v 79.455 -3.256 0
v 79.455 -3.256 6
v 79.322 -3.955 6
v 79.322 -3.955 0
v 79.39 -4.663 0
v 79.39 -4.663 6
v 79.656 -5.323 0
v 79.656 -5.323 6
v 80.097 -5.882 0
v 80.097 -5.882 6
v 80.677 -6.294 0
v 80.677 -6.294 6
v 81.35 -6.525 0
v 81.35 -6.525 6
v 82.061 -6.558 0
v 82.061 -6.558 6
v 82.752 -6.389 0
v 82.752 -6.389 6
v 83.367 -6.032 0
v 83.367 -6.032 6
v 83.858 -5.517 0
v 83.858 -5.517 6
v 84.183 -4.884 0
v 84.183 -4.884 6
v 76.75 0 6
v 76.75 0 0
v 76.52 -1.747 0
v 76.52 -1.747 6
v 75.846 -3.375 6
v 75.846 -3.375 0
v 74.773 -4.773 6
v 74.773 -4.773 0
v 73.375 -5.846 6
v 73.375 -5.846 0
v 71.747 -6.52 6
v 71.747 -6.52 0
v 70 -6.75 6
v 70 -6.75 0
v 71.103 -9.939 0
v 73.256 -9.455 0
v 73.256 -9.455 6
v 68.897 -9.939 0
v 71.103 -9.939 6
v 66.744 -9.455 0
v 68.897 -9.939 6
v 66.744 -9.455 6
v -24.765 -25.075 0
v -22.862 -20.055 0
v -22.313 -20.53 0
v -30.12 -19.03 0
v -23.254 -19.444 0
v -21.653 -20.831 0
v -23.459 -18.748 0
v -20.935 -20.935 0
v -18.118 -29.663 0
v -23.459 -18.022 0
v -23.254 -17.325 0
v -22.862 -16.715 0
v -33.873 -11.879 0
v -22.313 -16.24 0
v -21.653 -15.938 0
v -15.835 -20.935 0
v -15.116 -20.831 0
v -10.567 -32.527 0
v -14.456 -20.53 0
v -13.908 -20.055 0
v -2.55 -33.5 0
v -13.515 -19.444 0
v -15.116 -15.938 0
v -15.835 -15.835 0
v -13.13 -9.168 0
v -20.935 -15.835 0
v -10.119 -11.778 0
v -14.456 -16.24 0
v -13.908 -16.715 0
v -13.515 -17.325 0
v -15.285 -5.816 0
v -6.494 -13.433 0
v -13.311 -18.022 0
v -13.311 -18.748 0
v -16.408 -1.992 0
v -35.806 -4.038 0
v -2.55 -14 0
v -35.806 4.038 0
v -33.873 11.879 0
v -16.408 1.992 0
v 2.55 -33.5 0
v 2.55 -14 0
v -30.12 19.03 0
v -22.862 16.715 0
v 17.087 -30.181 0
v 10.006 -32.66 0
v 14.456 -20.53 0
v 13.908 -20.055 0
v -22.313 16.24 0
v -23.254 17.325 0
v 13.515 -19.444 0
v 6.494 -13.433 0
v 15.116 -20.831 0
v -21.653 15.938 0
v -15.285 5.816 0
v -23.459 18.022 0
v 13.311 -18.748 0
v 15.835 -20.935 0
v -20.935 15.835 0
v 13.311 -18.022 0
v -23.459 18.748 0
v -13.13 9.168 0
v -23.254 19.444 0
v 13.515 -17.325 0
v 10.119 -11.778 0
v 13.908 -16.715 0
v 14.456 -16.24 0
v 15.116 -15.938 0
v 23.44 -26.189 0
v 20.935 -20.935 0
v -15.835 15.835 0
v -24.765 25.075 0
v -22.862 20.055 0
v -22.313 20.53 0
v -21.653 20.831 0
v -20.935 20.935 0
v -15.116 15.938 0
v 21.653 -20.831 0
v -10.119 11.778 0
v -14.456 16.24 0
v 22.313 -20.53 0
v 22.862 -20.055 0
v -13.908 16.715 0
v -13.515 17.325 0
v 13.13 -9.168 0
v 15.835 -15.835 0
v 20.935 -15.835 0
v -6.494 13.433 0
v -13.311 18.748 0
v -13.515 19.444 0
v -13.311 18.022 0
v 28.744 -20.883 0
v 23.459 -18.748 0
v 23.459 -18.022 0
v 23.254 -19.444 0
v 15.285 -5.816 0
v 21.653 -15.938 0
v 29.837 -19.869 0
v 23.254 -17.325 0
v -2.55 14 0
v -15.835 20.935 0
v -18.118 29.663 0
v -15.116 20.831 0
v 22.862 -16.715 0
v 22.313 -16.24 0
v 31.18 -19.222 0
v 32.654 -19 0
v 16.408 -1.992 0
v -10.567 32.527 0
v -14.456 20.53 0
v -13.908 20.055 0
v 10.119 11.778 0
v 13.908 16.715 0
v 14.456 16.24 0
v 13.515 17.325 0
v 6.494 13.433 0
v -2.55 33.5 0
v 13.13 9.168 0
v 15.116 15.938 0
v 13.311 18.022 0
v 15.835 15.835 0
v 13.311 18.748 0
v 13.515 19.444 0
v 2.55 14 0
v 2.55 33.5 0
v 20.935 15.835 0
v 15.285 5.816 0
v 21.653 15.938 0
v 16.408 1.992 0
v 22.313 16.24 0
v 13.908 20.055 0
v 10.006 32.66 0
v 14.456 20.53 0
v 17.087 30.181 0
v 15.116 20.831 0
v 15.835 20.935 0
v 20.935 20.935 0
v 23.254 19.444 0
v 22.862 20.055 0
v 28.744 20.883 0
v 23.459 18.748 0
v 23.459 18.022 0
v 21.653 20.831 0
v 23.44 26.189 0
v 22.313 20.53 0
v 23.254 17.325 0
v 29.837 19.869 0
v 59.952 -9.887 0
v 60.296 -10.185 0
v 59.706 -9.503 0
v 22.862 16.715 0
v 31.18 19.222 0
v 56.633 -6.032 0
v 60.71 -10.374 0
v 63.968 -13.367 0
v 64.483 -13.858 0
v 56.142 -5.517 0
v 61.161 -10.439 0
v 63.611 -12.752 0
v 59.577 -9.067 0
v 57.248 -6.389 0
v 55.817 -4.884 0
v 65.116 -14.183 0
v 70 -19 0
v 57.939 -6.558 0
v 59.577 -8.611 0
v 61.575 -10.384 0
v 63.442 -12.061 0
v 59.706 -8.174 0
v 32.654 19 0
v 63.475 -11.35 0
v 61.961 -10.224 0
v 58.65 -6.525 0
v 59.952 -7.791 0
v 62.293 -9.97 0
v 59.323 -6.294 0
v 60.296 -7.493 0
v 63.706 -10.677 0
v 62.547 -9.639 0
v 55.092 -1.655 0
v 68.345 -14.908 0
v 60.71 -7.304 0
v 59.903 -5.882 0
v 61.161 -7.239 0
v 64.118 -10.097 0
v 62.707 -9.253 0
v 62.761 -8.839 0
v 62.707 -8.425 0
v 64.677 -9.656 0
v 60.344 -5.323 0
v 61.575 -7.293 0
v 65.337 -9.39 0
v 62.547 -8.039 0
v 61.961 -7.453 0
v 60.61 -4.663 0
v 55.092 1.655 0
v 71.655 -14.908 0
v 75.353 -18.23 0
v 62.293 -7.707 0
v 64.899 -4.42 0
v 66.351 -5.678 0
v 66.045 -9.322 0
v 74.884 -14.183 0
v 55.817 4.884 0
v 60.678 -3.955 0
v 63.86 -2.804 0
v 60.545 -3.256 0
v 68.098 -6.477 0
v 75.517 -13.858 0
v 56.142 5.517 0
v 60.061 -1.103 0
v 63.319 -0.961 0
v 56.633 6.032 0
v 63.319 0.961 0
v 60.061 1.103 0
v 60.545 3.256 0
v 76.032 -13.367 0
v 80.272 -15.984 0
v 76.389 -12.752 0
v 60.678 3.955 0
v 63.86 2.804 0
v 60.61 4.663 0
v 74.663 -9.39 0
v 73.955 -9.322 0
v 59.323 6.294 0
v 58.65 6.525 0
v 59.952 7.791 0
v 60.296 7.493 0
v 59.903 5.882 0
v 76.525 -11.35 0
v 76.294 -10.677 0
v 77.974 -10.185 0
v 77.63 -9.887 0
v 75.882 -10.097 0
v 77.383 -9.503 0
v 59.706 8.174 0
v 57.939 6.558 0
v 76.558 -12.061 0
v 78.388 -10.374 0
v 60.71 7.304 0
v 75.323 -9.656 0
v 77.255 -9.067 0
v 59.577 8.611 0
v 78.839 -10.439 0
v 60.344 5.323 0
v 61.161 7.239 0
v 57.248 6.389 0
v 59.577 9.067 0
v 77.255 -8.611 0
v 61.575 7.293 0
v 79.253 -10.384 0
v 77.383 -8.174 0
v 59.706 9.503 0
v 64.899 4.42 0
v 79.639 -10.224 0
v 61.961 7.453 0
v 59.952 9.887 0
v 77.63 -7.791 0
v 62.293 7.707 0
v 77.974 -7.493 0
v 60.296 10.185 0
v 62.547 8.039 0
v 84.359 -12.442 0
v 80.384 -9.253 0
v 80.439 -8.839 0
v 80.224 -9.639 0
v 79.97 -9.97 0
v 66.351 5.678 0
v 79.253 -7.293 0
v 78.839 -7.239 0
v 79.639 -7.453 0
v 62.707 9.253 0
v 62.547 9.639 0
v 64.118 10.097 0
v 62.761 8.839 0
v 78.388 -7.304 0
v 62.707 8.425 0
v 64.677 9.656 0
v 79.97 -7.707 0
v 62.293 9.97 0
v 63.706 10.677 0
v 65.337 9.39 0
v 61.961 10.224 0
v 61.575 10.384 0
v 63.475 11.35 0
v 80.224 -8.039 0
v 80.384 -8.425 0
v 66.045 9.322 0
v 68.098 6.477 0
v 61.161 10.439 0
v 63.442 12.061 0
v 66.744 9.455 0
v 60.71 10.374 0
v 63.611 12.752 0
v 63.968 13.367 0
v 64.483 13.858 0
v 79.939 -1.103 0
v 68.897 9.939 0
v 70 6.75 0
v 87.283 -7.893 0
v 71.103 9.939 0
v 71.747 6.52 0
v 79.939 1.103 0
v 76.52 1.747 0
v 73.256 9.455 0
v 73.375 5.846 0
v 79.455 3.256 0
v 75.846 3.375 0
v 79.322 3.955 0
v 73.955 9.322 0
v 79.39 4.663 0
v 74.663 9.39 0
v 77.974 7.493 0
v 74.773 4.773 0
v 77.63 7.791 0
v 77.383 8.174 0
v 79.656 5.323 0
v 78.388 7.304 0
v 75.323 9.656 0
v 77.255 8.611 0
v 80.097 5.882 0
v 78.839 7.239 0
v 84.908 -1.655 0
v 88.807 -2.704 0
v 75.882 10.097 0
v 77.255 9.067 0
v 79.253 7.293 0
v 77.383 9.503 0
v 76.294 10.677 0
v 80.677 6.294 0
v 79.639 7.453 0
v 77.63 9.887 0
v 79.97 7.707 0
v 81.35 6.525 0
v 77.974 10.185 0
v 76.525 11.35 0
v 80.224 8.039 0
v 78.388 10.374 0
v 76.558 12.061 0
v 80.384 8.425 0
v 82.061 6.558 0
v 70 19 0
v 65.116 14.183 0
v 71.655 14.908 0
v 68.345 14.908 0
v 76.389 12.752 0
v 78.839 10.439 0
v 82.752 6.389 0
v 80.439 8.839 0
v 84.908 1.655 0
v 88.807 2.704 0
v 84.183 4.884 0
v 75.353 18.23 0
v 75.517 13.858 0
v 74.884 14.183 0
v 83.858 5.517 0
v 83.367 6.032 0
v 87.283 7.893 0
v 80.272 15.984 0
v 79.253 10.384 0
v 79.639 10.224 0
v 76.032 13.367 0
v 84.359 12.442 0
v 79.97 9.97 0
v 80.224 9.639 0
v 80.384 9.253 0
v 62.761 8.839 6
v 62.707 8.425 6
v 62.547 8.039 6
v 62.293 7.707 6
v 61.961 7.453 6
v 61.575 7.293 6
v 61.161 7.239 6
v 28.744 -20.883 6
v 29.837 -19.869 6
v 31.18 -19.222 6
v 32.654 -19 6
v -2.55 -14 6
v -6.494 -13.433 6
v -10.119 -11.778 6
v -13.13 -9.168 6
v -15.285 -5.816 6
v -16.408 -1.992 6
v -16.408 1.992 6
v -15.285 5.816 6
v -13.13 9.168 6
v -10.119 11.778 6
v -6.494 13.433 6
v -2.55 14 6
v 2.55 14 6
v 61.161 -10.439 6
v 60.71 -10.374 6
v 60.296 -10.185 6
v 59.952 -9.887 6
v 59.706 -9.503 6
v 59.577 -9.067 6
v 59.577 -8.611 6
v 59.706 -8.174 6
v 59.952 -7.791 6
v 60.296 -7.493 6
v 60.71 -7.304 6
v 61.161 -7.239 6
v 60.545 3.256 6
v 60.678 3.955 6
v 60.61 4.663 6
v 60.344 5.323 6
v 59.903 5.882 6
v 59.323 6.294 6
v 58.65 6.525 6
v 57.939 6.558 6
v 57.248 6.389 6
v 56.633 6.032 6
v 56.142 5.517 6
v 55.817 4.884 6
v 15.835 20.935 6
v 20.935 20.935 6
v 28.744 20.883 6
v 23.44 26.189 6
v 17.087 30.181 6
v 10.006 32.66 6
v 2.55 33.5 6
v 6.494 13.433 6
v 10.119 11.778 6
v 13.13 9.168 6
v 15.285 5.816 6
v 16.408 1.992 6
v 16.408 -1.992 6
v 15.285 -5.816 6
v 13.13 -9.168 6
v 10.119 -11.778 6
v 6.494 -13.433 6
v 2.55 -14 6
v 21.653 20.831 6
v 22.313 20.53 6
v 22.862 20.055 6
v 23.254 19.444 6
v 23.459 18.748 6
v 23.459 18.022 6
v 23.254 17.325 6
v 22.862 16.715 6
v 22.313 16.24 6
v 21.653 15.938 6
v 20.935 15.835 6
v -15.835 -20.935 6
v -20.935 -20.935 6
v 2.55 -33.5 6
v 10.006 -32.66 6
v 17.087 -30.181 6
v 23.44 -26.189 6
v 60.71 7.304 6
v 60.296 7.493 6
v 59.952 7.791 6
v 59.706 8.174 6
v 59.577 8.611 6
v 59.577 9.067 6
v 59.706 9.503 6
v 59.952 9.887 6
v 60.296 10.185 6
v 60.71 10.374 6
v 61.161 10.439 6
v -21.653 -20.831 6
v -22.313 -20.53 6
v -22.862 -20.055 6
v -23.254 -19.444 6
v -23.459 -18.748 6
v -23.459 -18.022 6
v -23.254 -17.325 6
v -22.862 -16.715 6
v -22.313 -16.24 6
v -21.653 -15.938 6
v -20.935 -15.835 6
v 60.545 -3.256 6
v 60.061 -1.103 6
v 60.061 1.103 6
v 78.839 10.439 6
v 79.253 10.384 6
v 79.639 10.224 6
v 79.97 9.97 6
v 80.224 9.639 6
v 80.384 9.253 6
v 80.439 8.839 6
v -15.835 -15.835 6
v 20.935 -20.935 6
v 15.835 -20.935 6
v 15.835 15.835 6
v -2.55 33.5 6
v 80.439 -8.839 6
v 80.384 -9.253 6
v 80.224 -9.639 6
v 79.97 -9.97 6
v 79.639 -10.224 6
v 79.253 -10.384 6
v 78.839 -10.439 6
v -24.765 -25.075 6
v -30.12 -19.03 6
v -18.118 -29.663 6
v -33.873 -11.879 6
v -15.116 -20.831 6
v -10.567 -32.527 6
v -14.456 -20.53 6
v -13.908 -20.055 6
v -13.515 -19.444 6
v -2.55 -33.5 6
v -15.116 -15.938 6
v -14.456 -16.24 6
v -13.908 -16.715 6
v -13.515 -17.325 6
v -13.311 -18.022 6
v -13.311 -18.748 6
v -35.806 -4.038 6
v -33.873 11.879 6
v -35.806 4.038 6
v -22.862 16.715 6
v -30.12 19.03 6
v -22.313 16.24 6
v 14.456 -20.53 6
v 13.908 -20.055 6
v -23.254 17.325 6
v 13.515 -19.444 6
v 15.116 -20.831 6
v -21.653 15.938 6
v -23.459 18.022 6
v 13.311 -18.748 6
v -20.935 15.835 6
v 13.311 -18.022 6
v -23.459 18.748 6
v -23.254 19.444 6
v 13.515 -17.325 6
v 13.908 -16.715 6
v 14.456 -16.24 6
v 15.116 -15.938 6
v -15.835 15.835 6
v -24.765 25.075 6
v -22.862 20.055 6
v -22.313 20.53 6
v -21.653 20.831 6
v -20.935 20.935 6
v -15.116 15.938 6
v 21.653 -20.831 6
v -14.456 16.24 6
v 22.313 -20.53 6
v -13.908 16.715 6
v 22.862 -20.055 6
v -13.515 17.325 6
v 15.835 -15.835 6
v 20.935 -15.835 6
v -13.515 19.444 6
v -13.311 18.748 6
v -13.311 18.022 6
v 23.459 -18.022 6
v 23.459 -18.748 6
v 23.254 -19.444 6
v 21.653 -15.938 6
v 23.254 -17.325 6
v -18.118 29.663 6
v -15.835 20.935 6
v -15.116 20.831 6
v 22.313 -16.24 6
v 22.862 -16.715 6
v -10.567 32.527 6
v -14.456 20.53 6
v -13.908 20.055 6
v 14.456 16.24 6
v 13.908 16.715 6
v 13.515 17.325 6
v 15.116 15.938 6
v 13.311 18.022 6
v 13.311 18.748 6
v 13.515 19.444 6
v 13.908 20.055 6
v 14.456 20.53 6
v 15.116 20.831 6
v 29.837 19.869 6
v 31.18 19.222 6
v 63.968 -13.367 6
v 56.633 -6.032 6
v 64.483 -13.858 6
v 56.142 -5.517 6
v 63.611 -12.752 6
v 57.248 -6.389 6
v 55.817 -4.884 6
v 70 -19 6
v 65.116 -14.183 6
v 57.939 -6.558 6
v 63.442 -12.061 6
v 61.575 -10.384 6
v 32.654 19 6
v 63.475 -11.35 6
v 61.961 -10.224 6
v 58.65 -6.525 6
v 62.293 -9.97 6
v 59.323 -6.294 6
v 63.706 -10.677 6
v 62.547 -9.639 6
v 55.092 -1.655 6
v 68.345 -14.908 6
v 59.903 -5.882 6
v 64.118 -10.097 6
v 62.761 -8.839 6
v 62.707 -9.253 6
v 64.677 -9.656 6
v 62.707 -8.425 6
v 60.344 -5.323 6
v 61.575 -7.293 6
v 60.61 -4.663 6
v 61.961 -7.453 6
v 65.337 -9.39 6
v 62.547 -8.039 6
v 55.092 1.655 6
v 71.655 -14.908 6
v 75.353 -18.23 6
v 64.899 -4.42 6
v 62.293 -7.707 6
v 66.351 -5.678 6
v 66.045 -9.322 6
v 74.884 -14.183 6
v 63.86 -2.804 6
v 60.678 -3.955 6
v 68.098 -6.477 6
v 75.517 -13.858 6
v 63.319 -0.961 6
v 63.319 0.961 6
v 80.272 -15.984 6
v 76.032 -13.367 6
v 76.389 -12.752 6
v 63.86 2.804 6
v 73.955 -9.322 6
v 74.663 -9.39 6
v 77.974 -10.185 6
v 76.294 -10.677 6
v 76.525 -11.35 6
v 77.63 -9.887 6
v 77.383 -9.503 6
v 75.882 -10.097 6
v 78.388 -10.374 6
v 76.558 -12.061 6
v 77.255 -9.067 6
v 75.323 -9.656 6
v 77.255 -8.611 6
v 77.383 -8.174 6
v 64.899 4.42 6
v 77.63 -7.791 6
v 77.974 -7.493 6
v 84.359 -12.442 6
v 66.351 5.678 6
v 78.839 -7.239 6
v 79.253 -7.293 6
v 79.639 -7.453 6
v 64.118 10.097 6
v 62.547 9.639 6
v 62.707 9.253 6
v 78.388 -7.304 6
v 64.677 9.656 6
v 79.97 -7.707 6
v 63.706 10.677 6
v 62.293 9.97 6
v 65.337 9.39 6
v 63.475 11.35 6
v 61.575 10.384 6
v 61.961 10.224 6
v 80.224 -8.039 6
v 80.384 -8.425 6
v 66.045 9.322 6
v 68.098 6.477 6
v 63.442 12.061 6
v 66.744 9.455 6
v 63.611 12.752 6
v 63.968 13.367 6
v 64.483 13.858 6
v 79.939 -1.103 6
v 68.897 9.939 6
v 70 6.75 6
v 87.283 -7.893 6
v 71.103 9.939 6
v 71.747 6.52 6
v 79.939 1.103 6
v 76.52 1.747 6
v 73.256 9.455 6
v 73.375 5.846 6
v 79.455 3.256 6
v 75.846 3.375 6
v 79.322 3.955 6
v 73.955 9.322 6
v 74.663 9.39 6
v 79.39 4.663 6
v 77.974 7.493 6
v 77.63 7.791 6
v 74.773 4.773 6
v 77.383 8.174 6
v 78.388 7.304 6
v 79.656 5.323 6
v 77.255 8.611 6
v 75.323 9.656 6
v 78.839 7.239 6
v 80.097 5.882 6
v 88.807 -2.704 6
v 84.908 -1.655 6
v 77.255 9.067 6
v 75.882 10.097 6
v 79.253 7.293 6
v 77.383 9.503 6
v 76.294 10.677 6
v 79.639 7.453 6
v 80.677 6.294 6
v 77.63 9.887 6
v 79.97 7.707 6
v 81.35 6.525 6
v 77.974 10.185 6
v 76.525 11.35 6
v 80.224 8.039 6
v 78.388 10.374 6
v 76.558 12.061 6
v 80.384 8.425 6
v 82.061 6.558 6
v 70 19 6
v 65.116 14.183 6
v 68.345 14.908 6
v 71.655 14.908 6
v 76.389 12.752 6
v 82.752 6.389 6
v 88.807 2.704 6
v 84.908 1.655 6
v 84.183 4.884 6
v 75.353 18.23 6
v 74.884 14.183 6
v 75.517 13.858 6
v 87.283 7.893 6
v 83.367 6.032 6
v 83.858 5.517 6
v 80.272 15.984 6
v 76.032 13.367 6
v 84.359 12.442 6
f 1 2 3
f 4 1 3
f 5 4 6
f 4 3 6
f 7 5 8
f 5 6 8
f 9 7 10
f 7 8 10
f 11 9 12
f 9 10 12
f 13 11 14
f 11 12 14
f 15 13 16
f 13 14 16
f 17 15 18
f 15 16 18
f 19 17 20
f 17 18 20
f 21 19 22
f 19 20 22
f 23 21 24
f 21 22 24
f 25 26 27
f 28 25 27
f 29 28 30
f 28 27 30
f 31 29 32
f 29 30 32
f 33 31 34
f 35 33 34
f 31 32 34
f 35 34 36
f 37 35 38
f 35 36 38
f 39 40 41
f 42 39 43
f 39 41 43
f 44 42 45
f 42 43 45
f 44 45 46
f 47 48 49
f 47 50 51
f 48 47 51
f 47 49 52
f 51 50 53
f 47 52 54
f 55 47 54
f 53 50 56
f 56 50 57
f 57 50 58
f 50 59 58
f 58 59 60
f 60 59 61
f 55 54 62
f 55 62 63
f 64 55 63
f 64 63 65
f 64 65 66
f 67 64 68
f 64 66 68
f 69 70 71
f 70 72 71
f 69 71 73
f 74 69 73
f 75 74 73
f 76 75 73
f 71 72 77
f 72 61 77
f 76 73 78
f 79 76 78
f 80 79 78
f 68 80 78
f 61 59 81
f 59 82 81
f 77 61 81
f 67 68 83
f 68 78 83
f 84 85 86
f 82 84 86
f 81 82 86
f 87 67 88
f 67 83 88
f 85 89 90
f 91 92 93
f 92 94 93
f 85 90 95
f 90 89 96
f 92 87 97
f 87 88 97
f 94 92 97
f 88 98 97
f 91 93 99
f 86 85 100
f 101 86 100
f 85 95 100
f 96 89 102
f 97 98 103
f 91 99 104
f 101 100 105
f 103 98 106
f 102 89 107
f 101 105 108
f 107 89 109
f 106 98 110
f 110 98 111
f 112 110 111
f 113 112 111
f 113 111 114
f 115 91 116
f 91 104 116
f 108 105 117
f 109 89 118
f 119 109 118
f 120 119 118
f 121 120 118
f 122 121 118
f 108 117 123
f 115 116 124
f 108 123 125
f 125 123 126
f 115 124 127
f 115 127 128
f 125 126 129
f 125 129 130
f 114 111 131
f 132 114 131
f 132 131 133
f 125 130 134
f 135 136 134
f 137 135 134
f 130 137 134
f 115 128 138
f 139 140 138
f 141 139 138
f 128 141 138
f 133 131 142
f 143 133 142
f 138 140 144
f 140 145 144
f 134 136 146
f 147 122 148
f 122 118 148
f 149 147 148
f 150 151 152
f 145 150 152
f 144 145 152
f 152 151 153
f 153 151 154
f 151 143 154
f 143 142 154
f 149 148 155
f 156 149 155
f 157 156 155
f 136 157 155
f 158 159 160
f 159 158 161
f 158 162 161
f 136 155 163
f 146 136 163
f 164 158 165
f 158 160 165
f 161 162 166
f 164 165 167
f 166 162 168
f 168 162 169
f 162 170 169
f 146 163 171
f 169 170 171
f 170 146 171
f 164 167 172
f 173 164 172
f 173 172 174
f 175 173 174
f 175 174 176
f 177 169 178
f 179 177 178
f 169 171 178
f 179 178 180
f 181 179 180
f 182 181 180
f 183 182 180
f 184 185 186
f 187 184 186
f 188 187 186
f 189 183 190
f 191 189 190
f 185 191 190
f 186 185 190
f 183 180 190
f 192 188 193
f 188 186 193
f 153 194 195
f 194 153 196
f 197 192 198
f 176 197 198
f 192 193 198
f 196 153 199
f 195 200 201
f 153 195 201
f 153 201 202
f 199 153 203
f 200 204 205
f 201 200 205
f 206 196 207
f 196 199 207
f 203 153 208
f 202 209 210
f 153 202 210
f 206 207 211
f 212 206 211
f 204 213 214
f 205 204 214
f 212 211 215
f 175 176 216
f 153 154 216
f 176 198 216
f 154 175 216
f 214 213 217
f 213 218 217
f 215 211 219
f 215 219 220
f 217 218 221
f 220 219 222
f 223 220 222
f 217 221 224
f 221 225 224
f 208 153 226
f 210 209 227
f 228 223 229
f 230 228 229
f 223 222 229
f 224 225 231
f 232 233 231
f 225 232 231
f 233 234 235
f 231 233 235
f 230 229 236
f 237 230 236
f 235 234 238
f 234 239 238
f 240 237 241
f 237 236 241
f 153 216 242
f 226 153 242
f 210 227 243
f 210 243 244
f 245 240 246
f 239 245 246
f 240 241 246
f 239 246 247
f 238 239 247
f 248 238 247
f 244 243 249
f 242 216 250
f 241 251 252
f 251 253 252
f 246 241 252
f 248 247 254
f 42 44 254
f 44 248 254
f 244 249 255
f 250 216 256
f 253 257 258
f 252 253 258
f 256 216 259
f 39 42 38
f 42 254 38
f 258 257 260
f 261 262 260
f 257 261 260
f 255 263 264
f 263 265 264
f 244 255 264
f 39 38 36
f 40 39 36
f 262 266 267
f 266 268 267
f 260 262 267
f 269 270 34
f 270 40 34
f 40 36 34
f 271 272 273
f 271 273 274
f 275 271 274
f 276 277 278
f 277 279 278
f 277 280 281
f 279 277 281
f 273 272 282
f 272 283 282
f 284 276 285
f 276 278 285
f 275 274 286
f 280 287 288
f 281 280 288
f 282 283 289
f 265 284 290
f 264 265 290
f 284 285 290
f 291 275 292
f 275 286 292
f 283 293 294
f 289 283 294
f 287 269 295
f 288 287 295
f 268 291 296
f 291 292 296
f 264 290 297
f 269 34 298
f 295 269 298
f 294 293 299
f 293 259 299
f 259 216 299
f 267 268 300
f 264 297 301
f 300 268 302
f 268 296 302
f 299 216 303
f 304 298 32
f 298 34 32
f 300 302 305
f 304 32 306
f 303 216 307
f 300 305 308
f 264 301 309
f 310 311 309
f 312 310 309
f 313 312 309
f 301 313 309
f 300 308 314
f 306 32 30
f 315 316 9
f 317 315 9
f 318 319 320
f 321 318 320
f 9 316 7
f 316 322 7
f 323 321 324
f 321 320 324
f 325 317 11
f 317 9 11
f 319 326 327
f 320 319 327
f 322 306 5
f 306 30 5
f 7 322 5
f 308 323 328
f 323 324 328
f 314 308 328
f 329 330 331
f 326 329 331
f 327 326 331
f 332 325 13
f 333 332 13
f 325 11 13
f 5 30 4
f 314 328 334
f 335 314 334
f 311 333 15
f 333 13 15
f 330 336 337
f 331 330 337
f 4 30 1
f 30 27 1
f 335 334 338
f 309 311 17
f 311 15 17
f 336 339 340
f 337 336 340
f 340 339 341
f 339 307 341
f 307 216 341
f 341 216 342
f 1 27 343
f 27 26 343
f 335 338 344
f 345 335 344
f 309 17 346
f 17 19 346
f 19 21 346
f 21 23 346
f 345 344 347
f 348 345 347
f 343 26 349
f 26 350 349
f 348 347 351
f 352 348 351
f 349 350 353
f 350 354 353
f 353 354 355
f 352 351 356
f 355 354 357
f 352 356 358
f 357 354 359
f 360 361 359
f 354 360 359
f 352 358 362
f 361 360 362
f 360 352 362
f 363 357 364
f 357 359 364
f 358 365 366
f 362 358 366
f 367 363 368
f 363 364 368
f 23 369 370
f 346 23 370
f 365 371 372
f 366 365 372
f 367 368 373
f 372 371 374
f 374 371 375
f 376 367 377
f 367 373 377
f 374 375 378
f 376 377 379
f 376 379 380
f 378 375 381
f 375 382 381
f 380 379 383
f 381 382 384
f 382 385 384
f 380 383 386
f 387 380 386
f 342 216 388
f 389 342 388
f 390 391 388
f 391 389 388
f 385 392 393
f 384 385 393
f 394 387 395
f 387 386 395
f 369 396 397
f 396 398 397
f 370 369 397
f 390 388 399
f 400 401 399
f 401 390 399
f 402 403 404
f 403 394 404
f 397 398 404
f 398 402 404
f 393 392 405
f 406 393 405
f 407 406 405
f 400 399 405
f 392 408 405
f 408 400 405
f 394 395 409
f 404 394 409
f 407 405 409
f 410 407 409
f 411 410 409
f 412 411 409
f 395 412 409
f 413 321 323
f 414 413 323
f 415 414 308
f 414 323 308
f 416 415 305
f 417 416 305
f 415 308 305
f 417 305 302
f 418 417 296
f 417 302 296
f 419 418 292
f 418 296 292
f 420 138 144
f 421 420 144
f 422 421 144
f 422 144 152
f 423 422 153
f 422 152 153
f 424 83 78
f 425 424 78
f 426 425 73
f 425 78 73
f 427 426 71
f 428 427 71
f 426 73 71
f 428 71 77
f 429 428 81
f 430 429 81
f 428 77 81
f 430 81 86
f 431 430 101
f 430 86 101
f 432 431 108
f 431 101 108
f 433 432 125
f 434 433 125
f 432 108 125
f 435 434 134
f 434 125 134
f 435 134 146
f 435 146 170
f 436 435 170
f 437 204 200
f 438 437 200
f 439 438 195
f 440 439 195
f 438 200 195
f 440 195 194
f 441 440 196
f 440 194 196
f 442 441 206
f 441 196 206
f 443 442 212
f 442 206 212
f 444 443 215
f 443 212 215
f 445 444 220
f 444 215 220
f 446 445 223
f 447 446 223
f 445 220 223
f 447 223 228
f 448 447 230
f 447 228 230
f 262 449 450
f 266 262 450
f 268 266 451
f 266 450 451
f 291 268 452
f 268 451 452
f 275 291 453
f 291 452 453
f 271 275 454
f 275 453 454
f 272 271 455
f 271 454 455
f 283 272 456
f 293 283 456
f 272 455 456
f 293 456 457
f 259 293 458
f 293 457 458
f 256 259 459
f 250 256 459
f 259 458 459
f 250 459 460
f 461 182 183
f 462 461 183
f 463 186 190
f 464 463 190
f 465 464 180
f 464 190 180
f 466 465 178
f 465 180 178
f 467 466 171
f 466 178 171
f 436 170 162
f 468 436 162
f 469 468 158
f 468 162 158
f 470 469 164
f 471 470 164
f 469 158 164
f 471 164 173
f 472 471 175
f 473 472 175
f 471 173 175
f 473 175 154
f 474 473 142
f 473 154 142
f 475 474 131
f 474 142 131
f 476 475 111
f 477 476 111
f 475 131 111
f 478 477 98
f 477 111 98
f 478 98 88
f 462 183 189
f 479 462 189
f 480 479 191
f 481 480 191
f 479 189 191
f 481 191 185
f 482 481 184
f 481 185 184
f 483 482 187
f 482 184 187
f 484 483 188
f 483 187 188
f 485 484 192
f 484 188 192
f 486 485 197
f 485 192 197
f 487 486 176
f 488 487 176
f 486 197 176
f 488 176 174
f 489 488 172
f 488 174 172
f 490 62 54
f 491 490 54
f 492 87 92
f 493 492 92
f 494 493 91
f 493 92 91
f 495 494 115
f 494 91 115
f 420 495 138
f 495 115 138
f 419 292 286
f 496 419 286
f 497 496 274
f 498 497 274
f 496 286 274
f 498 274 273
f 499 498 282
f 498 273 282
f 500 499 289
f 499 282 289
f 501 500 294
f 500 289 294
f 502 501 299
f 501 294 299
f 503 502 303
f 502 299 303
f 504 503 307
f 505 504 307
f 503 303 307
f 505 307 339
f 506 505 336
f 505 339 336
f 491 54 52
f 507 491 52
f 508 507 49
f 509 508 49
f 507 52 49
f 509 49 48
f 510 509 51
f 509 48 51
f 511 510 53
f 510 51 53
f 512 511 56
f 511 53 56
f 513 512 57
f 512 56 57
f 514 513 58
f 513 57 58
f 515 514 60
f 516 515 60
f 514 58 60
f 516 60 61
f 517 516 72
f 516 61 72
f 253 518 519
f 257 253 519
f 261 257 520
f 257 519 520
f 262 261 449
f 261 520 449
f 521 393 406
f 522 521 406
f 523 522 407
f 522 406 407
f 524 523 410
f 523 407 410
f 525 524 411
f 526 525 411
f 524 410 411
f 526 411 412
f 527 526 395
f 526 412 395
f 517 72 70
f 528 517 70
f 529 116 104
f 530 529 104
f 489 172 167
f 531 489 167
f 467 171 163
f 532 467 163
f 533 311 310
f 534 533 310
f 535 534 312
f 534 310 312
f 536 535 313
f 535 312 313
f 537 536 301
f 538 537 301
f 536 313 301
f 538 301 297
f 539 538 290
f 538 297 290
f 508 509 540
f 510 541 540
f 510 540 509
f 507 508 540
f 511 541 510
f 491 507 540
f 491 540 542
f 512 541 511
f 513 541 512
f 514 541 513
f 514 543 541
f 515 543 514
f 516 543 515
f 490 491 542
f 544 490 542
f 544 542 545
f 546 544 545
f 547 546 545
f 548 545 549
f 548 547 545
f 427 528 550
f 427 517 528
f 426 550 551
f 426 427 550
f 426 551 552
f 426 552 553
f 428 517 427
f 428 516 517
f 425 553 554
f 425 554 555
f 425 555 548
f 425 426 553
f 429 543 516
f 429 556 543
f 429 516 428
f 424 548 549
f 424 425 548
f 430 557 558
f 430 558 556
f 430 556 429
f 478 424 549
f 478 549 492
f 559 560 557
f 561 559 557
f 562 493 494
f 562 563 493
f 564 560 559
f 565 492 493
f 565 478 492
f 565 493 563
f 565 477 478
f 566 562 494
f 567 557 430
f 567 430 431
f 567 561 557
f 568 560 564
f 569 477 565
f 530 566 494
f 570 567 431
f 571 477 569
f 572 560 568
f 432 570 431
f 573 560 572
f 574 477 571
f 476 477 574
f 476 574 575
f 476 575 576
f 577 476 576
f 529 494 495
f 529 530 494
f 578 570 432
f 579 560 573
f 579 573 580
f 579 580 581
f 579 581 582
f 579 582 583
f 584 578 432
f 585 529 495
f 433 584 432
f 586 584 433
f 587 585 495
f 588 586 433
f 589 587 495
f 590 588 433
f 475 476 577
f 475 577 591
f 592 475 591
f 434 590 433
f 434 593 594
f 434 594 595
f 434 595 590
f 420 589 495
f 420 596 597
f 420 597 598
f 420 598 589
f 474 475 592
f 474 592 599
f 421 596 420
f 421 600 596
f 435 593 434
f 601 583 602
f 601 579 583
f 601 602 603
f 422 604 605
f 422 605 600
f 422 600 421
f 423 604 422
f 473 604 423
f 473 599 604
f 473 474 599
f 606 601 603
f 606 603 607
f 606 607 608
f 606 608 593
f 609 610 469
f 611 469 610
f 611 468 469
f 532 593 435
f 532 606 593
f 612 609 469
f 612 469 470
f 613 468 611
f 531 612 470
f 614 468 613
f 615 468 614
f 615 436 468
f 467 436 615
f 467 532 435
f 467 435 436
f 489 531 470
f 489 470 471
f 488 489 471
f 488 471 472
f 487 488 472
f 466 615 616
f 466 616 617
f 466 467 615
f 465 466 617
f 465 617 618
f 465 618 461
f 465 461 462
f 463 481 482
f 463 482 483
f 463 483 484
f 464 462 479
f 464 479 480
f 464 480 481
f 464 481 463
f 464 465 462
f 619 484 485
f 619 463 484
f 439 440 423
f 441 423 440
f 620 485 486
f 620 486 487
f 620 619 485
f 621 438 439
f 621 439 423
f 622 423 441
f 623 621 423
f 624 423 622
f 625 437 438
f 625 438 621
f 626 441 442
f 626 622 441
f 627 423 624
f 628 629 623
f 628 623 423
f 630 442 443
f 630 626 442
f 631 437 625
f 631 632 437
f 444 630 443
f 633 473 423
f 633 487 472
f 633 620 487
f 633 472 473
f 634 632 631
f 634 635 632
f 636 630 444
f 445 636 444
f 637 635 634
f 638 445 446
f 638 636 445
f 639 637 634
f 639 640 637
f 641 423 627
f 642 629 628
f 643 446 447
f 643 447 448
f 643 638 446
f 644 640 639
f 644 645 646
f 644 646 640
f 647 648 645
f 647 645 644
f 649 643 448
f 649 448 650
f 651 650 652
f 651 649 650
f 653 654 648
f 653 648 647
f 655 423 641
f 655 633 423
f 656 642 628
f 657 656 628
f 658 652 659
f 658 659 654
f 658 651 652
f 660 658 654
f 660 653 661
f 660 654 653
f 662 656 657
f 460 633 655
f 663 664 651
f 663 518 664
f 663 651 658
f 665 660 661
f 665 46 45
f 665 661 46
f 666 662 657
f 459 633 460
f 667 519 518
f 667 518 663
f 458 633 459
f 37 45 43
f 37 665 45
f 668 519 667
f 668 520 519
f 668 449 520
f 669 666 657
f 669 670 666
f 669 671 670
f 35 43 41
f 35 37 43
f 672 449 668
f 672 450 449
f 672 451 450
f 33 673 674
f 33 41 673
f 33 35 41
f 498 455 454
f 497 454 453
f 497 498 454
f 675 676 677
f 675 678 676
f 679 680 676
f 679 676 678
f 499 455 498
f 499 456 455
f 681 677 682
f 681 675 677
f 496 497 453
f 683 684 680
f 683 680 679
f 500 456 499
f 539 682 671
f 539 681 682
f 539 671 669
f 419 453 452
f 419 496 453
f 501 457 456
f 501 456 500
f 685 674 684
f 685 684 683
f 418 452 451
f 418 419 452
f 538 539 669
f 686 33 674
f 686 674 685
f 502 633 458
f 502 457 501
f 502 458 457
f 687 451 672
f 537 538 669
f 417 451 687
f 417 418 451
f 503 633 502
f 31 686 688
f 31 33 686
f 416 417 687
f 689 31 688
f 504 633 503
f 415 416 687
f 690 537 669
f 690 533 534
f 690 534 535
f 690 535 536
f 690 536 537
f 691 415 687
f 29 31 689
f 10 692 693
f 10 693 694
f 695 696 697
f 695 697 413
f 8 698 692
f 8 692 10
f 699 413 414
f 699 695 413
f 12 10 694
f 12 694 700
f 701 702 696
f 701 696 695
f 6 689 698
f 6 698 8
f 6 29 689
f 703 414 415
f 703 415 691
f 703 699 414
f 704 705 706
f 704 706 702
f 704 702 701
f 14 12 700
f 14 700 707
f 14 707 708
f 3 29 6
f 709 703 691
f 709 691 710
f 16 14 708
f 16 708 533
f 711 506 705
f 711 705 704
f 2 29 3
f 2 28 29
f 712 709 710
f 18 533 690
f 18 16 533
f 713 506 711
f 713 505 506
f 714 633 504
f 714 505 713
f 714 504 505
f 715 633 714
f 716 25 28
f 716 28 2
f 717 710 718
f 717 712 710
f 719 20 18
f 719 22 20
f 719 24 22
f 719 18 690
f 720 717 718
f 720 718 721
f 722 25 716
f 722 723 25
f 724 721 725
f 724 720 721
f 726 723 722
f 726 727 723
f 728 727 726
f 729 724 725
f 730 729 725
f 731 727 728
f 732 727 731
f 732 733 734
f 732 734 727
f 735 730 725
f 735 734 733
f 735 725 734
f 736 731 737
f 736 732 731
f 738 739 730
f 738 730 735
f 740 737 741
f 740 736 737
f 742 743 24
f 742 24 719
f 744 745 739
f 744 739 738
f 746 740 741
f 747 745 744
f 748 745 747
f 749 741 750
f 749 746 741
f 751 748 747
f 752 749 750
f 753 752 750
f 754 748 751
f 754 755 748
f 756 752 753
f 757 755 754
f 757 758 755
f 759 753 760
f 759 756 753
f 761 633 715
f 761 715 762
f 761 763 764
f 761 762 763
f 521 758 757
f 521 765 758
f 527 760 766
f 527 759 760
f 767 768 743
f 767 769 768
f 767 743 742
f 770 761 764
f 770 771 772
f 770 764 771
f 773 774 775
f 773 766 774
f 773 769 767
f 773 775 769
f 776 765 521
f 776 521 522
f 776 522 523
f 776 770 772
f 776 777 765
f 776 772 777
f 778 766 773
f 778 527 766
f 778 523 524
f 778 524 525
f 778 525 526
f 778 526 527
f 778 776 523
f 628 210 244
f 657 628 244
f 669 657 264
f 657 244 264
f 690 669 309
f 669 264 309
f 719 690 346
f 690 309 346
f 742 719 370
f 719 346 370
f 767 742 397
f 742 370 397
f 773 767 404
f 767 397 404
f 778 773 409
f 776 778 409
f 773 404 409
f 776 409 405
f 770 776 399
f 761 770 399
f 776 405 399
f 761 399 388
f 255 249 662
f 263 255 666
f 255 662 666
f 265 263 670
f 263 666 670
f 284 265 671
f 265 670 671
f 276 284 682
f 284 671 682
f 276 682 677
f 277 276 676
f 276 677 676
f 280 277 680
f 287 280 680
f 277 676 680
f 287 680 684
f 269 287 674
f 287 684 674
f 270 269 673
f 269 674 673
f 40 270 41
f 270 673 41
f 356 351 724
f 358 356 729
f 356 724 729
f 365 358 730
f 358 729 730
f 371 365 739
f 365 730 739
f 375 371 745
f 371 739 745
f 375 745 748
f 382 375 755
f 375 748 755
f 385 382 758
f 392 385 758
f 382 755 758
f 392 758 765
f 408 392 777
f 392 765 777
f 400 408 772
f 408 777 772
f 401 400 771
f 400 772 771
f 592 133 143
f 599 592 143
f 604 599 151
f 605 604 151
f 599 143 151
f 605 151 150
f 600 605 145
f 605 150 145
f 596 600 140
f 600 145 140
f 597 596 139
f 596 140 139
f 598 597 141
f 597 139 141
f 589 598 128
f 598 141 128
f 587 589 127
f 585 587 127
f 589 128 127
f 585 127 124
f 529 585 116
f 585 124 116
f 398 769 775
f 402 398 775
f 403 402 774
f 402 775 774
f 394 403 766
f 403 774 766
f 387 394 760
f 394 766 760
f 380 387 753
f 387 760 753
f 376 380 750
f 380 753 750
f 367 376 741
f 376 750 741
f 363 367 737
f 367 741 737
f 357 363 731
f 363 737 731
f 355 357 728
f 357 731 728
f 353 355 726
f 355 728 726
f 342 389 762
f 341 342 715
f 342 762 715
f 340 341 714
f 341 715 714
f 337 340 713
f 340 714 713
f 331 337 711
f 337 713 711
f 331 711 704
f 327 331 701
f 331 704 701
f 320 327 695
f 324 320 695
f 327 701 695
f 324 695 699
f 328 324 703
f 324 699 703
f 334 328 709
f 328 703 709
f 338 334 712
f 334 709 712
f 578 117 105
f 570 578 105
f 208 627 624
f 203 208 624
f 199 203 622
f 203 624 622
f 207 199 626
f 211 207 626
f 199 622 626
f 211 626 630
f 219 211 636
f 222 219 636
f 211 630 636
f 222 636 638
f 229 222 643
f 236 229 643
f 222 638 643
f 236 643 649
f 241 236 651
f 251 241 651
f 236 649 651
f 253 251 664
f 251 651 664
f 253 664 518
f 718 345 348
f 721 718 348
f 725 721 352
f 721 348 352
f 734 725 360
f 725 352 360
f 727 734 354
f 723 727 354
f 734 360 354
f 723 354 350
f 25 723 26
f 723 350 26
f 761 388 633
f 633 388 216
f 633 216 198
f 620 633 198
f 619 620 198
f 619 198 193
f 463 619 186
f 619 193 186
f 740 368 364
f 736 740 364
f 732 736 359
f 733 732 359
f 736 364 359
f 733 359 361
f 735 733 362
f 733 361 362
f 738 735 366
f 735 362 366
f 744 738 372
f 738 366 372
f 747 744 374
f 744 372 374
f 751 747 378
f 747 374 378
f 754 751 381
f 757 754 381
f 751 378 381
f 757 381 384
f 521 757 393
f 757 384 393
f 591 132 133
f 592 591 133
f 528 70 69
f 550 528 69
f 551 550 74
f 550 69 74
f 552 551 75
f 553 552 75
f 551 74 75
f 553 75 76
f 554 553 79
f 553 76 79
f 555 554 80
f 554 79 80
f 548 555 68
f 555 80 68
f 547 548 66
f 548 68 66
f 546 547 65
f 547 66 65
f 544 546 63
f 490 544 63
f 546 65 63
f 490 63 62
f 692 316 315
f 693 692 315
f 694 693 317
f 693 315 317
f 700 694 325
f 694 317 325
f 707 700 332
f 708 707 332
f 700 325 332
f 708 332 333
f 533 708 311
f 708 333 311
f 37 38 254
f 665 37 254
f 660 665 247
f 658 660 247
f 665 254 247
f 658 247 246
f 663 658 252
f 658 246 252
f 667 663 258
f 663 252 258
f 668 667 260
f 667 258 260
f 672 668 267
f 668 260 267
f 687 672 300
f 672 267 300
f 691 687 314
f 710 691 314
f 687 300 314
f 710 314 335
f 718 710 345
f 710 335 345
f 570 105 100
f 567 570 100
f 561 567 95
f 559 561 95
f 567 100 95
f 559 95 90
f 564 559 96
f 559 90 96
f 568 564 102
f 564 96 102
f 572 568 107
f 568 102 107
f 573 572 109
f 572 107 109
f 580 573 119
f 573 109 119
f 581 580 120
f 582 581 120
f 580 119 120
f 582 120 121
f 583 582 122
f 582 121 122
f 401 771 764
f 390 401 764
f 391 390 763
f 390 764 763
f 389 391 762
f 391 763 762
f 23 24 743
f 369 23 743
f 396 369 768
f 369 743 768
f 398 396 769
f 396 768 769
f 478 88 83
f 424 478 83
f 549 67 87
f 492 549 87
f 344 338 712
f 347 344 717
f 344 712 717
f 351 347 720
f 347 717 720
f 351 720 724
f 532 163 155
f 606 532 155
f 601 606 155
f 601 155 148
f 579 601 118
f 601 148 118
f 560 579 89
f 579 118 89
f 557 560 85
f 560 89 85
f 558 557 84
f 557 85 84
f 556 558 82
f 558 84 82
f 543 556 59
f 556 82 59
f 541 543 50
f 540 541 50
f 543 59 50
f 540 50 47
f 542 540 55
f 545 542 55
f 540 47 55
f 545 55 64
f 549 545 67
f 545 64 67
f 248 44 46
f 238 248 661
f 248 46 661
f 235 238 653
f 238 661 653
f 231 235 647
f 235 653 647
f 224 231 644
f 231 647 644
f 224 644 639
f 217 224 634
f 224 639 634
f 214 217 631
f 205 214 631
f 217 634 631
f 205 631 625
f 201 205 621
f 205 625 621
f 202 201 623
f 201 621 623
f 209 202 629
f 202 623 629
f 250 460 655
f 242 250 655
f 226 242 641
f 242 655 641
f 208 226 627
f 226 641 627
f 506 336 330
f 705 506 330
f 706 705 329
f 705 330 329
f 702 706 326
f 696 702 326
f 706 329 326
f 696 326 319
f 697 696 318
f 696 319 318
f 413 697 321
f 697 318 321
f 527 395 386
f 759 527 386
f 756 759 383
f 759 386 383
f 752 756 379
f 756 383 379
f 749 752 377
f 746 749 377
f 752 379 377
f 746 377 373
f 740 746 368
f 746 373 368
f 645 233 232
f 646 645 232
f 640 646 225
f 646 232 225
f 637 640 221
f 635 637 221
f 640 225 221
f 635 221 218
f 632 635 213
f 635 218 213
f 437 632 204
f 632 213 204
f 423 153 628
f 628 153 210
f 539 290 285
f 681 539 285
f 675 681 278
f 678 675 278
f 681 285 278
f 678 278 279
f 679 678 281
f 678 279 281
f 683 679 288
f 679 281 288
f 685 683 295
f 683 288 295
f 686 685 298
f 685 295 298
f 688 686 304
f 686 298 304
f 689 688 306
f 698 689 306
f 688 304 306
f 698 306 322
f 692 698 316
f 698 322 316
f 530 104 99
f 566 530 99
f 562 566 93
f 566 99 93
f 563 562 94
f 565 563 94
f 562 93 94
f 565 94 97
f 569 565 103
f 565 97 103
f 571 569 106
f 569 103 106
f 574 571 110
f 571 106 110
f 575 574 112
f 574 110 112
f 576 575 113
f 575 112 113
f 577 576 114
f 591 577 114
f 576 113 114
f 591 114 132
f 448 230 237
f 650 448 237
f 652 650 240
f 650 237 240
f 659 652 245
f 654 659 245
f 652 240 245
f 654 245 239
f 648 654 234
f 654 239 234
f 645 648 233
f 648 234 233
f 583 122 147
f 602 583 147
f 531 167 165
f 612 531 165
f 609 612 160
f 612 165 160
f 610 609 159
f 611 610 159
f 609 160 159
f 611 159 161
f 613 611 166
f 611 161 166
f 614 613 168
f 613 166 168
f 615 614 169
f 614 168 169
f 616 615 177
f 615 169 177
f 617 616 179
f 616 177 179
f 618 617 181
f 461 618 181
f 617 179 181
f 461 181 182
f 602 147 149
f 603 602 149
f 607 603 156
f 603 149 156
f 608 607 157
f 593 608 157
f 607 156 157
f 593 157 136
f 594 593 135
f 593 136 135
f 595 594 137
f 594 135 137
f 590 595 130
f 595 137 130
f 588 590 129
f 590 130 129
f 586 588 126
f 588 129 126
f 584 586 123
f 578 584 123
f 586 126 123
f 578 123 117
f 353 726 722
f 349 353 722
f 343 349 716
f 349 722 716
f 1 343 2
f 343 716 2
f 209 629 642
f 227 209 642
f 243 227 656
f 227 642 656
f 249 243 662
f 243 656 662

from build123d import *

# Parameters (mm, degrees)
F1_DEPTH = 6
F3_DEPTH = 25


with BuildPart() as f1:
    # F0 (on Top) → F1 (new body)
    with BuildSketch(Plane.XY):
        with BuildLine():
            Line((32.653986447, -19), (70, -19))
            ThreePointArc((70, -19), (89, 0), (70, 19))
            Line((70, 19), (32.653986447, 19))
            ThreePointArc((32.653986447, 19), (30.4842417137, 19.4953126865), (28.7443778175, 20.8831168831))
            ThreePointArc((28.7443778175, 20.8831168831), (17.0872897133, 30.1814050003), (2.55, 33.5))
            Line((2.55, 33.5), (-2.55, 33.5))
            ThreePointArc((-2.55, 33.5), (-36.05, 0), (-2.55, -33.5))
            Line((-2.55, -33.5), (2.55, -33.5))
            ThreePointArc((2.55, -33.5), (17.0872897133, -30.1814050003), (28.7443778175, -20.8831168831))
            ThreePointArc((28.7443778175, -20.8831168831), (30.4842417137, -19.4953126865), (32.653986447, -19))
        make_face()
        with BuildLine():
            Line((-15.8347763109, -20.9347763109), (-20.9347763109, -20.9347763109))
            ThreePointArc((-20.9347763109, -20.9347763109), (-23.4847763109, -18.3847763109), (-20.9347763109, -15.8347763109))
            Line((-20.9347763109, -15.8347763109), (-15.8347763109, -15.8347763109))
            ThreePointArc((-15.8347763109, -15.8347763109), (-13.2847763109, -18.3847763109), (-15.8347763109, -20.9347763109))
        make_face(mode=Mode.SUBTRACT)
        with BuildLine():
            Line((20.9347763109, -20.9347763109), (15.8347763109, -20.9347763109))
            ThreePointArc((15.8347763109, -20.9347763109), (13.2847763109, -18.3847763109), (15.8347763109, -15.8347763109))
            Line((15.8347763109, -15.8347763109), (20.9347763109, -15.8347763109))
            ThreePointArc((20.9347763109, -15.8347763109), (23.4847763109, -18.3847763109), (20.9347763109, -20.9347763109))
        make_face(mode=Mode.SUBTRACT)
        with BuildLine():
            ThreePointArc((61.1611652352, -7.2388347648), (62.2925360851, -7.7074639149), (62.7611652352, -8.8388347648))
            ThreePointArc((62.7611652352, -8.8388347648), (62.2925360851, -9.9702056147), (61.1611652352, -10.4388347648))
            ThreePointArc((61.1611652352, -10.4388347648), (59.5611652352, -8.8388347648), (61.1611652352, -7.2388347648))
        make_face(mode=Mode.SUBTRACT)
        with BuildLine():
            ThreePointArc((78.8388347648, -7.2388347648), (79.9702056147, -7.7074639149), (80.4388347648, -8.8388347648))
            ThreePointArc((80.4388347648, -8.8388347648), (79.9702056147, -9.9702056147), (78.8388347648, -10.4388347648))
            ThreePointArc((78.8388347648, -10.4388347648), (77.2388347648, -8.8388347648), (78.8388347648, -7.2388347648))
        make_face(mode=Mode.SUBTRACT)
        with BuildLine():
            Line((-2.55, 14), (2.55, 14))
            ThreePointArc((2.55, 14), (16.55, 0), (2.55, -14))
            Line((2.55, -14), (-2.55, -14))
            ThreePointArc((-2.55, -14), (-16.55, 0), (-2.55, 14))
        make_face(mode=Mode.SUBTRACT)
        with BuildLine():
            Line((-15.8347763109, 15.8347763109), (-20.9347763109, 15.8347763109))
            ThreePointArc((-20.9347763109, 15.8347763109), (-23.4847763109, 18.3847763109), (-20.9347763109, 20.9347763109))
            Line((-20.9347763109, 20.9347763109), (-15.8347763109, 20.9347763109))
            ThreePointArc((-15.8347763109, 20.9347763109), (-13.2847763109, 18.3847763109), (-15.8347763109, 15.8347763109))
        make_face(mode=Mode.SUBTRACT)
        with BuildLine():
            Line((20.9347763109, 15.8347763109), (15.8347763109, 15.8347763109))
            ThreePointArc((15.8347763109, 15.8347763109), (13.2847763109, 18.3847763109), (15.8347763109, 20.9347763109))
            Line((15.8347763109, 20.9347763109), (20.9347763109, 20.9347763109))
            ThreePointArc((20.9347763109, 20.9347763109), (23.4847763109, 18.3847763109), (20.9347763109, 15.8347763109))
        make_face(mode=Mode.SUBTRACT)
        with BuildLine():
            ThreePointArc((70, 6.75), (74.772970773, 4.772970773), (76.75, 0))
            ThreePointArc((76.75, 0), (74.772970773, -4.772970773), (70, -6.75))
            ThreePointArc((70, -6.75), (63.25, 0), (70, 6.75))
        make_face(mode=Mode.SUBTRACT)
        with BuildLine():
            ThreePointArc((61.1611652352, 10.4388347648), (62.2925360851, 9.9702056147), (62.7611652352, 8.8388347648))
            ThreePointArc((62.7611652352, 8.8388347648), (62.2925360851, 7.7074639149), (61.1611652352, 7.2388347648))
            ThreePointArc((61.1611652352, 7.2388347648), (59.5611652352, 8.8388347648), (61.1611652352, 10.4388347648))
        make_face(mode=Mode.SUBTRACT)
        with BuildLine():
            ThreePointArc((78.8388347648, 10.4388347648), (79.9702056147, 9.9702056147), (80.4388347648, 8.8388347648))
            ThreePointArc((80.4388347648, 8.8388347648), (79.9702056147, 7.7074639149), (78.8388347648, 7.2388347648))
            ThreePointArc((78.8388347648, 7.2388347648), (77.2388347648, 8.8388347648), (78.8388347648, 10.4388347648))
        make_face(mode=Mode.SUBTRACT)
    extrude(amount=F1_DEPTH)

    # F2 (on face) → F3 (cut)
    with BuildSketch(Plane.XY.offset(6)):
        with BuildLine():
            ThreePointArc((60.544814244, 3.2556815446), (58.9949381912, 6.4333983697), (55.817221366, 4.8835223169))
            ThreePointArc((55.817221366, 4.8835223169), (55, 0), (55.817221366, -4.8835223169))
            ThreePointArc((55.817221366, -4.8835223169), (58.9949381912, -6.4333983697), (60.544814244, -3.2556815446))
            ThreePointArc((60.544814244, -3.2556815446), (60, 0), (60.544814244, 3.2556815446))
        make_face()
        with BuildLine():
            ThreePointArc((66.7443184554, -9.455185756), (63.5666016303, -11.0050618088), (65.1164776831, -14.182778634))
            ThreePointArc((65.1164776831, -14.182778634), (70, -15), (74.8835223169, -14.182778634))
            ThreePointArc((74.8835223169, -14.182778634), (76.4333983697, -11.0050618088), (73.2556815446, -9.455185756))
            ThreePointArc((73.2556815446, -9.455185756), (70, -10), (66.7443184554, -9.455185756))
        make_face()
        with BuildLine():
            ThreePointArc((79.455185756, -3.2556815446), (81.0050618088, -6.4333983697), (84.182778634, -4.8835223169))
            ThreePointArc((84.182778634, -4.8835223169), (85, 0), (84.182778634, 4.8835223169))
            ThreePointArc((84.182778634, 4.8835223169), (81.0050618088, 6.4333983697), (79.455185756, 3.2556815446))
            ThreePointArc((79.455185756, 3.2556815446), (80, 0), (79.455185756, -3.2556815446))
        make_face()
        with BuildLine():
            ThreePointArc((73.2556815446, 9.455185756), (76.4333983697, 11.0050618088), (74.8835223169, 14.182778634))
            ThreePointArc((74.8835223169, 14.182778634), (70, 15), (65.1164776831, 14.182778634))
            ThreePointArc((65.1164776831, 14.182778634), (63.5666016303, 11.0050618088), (66.7443184554, 9.455185756))
            ThreePointArc((66.7443184554, 9.455185756), (70, 10), (73.2556815446, 9.455185756))
        make_face()
    extrude(amount=-F3_DEPTH, mode=Mode.SUBTRACT)


solid = f1.part
